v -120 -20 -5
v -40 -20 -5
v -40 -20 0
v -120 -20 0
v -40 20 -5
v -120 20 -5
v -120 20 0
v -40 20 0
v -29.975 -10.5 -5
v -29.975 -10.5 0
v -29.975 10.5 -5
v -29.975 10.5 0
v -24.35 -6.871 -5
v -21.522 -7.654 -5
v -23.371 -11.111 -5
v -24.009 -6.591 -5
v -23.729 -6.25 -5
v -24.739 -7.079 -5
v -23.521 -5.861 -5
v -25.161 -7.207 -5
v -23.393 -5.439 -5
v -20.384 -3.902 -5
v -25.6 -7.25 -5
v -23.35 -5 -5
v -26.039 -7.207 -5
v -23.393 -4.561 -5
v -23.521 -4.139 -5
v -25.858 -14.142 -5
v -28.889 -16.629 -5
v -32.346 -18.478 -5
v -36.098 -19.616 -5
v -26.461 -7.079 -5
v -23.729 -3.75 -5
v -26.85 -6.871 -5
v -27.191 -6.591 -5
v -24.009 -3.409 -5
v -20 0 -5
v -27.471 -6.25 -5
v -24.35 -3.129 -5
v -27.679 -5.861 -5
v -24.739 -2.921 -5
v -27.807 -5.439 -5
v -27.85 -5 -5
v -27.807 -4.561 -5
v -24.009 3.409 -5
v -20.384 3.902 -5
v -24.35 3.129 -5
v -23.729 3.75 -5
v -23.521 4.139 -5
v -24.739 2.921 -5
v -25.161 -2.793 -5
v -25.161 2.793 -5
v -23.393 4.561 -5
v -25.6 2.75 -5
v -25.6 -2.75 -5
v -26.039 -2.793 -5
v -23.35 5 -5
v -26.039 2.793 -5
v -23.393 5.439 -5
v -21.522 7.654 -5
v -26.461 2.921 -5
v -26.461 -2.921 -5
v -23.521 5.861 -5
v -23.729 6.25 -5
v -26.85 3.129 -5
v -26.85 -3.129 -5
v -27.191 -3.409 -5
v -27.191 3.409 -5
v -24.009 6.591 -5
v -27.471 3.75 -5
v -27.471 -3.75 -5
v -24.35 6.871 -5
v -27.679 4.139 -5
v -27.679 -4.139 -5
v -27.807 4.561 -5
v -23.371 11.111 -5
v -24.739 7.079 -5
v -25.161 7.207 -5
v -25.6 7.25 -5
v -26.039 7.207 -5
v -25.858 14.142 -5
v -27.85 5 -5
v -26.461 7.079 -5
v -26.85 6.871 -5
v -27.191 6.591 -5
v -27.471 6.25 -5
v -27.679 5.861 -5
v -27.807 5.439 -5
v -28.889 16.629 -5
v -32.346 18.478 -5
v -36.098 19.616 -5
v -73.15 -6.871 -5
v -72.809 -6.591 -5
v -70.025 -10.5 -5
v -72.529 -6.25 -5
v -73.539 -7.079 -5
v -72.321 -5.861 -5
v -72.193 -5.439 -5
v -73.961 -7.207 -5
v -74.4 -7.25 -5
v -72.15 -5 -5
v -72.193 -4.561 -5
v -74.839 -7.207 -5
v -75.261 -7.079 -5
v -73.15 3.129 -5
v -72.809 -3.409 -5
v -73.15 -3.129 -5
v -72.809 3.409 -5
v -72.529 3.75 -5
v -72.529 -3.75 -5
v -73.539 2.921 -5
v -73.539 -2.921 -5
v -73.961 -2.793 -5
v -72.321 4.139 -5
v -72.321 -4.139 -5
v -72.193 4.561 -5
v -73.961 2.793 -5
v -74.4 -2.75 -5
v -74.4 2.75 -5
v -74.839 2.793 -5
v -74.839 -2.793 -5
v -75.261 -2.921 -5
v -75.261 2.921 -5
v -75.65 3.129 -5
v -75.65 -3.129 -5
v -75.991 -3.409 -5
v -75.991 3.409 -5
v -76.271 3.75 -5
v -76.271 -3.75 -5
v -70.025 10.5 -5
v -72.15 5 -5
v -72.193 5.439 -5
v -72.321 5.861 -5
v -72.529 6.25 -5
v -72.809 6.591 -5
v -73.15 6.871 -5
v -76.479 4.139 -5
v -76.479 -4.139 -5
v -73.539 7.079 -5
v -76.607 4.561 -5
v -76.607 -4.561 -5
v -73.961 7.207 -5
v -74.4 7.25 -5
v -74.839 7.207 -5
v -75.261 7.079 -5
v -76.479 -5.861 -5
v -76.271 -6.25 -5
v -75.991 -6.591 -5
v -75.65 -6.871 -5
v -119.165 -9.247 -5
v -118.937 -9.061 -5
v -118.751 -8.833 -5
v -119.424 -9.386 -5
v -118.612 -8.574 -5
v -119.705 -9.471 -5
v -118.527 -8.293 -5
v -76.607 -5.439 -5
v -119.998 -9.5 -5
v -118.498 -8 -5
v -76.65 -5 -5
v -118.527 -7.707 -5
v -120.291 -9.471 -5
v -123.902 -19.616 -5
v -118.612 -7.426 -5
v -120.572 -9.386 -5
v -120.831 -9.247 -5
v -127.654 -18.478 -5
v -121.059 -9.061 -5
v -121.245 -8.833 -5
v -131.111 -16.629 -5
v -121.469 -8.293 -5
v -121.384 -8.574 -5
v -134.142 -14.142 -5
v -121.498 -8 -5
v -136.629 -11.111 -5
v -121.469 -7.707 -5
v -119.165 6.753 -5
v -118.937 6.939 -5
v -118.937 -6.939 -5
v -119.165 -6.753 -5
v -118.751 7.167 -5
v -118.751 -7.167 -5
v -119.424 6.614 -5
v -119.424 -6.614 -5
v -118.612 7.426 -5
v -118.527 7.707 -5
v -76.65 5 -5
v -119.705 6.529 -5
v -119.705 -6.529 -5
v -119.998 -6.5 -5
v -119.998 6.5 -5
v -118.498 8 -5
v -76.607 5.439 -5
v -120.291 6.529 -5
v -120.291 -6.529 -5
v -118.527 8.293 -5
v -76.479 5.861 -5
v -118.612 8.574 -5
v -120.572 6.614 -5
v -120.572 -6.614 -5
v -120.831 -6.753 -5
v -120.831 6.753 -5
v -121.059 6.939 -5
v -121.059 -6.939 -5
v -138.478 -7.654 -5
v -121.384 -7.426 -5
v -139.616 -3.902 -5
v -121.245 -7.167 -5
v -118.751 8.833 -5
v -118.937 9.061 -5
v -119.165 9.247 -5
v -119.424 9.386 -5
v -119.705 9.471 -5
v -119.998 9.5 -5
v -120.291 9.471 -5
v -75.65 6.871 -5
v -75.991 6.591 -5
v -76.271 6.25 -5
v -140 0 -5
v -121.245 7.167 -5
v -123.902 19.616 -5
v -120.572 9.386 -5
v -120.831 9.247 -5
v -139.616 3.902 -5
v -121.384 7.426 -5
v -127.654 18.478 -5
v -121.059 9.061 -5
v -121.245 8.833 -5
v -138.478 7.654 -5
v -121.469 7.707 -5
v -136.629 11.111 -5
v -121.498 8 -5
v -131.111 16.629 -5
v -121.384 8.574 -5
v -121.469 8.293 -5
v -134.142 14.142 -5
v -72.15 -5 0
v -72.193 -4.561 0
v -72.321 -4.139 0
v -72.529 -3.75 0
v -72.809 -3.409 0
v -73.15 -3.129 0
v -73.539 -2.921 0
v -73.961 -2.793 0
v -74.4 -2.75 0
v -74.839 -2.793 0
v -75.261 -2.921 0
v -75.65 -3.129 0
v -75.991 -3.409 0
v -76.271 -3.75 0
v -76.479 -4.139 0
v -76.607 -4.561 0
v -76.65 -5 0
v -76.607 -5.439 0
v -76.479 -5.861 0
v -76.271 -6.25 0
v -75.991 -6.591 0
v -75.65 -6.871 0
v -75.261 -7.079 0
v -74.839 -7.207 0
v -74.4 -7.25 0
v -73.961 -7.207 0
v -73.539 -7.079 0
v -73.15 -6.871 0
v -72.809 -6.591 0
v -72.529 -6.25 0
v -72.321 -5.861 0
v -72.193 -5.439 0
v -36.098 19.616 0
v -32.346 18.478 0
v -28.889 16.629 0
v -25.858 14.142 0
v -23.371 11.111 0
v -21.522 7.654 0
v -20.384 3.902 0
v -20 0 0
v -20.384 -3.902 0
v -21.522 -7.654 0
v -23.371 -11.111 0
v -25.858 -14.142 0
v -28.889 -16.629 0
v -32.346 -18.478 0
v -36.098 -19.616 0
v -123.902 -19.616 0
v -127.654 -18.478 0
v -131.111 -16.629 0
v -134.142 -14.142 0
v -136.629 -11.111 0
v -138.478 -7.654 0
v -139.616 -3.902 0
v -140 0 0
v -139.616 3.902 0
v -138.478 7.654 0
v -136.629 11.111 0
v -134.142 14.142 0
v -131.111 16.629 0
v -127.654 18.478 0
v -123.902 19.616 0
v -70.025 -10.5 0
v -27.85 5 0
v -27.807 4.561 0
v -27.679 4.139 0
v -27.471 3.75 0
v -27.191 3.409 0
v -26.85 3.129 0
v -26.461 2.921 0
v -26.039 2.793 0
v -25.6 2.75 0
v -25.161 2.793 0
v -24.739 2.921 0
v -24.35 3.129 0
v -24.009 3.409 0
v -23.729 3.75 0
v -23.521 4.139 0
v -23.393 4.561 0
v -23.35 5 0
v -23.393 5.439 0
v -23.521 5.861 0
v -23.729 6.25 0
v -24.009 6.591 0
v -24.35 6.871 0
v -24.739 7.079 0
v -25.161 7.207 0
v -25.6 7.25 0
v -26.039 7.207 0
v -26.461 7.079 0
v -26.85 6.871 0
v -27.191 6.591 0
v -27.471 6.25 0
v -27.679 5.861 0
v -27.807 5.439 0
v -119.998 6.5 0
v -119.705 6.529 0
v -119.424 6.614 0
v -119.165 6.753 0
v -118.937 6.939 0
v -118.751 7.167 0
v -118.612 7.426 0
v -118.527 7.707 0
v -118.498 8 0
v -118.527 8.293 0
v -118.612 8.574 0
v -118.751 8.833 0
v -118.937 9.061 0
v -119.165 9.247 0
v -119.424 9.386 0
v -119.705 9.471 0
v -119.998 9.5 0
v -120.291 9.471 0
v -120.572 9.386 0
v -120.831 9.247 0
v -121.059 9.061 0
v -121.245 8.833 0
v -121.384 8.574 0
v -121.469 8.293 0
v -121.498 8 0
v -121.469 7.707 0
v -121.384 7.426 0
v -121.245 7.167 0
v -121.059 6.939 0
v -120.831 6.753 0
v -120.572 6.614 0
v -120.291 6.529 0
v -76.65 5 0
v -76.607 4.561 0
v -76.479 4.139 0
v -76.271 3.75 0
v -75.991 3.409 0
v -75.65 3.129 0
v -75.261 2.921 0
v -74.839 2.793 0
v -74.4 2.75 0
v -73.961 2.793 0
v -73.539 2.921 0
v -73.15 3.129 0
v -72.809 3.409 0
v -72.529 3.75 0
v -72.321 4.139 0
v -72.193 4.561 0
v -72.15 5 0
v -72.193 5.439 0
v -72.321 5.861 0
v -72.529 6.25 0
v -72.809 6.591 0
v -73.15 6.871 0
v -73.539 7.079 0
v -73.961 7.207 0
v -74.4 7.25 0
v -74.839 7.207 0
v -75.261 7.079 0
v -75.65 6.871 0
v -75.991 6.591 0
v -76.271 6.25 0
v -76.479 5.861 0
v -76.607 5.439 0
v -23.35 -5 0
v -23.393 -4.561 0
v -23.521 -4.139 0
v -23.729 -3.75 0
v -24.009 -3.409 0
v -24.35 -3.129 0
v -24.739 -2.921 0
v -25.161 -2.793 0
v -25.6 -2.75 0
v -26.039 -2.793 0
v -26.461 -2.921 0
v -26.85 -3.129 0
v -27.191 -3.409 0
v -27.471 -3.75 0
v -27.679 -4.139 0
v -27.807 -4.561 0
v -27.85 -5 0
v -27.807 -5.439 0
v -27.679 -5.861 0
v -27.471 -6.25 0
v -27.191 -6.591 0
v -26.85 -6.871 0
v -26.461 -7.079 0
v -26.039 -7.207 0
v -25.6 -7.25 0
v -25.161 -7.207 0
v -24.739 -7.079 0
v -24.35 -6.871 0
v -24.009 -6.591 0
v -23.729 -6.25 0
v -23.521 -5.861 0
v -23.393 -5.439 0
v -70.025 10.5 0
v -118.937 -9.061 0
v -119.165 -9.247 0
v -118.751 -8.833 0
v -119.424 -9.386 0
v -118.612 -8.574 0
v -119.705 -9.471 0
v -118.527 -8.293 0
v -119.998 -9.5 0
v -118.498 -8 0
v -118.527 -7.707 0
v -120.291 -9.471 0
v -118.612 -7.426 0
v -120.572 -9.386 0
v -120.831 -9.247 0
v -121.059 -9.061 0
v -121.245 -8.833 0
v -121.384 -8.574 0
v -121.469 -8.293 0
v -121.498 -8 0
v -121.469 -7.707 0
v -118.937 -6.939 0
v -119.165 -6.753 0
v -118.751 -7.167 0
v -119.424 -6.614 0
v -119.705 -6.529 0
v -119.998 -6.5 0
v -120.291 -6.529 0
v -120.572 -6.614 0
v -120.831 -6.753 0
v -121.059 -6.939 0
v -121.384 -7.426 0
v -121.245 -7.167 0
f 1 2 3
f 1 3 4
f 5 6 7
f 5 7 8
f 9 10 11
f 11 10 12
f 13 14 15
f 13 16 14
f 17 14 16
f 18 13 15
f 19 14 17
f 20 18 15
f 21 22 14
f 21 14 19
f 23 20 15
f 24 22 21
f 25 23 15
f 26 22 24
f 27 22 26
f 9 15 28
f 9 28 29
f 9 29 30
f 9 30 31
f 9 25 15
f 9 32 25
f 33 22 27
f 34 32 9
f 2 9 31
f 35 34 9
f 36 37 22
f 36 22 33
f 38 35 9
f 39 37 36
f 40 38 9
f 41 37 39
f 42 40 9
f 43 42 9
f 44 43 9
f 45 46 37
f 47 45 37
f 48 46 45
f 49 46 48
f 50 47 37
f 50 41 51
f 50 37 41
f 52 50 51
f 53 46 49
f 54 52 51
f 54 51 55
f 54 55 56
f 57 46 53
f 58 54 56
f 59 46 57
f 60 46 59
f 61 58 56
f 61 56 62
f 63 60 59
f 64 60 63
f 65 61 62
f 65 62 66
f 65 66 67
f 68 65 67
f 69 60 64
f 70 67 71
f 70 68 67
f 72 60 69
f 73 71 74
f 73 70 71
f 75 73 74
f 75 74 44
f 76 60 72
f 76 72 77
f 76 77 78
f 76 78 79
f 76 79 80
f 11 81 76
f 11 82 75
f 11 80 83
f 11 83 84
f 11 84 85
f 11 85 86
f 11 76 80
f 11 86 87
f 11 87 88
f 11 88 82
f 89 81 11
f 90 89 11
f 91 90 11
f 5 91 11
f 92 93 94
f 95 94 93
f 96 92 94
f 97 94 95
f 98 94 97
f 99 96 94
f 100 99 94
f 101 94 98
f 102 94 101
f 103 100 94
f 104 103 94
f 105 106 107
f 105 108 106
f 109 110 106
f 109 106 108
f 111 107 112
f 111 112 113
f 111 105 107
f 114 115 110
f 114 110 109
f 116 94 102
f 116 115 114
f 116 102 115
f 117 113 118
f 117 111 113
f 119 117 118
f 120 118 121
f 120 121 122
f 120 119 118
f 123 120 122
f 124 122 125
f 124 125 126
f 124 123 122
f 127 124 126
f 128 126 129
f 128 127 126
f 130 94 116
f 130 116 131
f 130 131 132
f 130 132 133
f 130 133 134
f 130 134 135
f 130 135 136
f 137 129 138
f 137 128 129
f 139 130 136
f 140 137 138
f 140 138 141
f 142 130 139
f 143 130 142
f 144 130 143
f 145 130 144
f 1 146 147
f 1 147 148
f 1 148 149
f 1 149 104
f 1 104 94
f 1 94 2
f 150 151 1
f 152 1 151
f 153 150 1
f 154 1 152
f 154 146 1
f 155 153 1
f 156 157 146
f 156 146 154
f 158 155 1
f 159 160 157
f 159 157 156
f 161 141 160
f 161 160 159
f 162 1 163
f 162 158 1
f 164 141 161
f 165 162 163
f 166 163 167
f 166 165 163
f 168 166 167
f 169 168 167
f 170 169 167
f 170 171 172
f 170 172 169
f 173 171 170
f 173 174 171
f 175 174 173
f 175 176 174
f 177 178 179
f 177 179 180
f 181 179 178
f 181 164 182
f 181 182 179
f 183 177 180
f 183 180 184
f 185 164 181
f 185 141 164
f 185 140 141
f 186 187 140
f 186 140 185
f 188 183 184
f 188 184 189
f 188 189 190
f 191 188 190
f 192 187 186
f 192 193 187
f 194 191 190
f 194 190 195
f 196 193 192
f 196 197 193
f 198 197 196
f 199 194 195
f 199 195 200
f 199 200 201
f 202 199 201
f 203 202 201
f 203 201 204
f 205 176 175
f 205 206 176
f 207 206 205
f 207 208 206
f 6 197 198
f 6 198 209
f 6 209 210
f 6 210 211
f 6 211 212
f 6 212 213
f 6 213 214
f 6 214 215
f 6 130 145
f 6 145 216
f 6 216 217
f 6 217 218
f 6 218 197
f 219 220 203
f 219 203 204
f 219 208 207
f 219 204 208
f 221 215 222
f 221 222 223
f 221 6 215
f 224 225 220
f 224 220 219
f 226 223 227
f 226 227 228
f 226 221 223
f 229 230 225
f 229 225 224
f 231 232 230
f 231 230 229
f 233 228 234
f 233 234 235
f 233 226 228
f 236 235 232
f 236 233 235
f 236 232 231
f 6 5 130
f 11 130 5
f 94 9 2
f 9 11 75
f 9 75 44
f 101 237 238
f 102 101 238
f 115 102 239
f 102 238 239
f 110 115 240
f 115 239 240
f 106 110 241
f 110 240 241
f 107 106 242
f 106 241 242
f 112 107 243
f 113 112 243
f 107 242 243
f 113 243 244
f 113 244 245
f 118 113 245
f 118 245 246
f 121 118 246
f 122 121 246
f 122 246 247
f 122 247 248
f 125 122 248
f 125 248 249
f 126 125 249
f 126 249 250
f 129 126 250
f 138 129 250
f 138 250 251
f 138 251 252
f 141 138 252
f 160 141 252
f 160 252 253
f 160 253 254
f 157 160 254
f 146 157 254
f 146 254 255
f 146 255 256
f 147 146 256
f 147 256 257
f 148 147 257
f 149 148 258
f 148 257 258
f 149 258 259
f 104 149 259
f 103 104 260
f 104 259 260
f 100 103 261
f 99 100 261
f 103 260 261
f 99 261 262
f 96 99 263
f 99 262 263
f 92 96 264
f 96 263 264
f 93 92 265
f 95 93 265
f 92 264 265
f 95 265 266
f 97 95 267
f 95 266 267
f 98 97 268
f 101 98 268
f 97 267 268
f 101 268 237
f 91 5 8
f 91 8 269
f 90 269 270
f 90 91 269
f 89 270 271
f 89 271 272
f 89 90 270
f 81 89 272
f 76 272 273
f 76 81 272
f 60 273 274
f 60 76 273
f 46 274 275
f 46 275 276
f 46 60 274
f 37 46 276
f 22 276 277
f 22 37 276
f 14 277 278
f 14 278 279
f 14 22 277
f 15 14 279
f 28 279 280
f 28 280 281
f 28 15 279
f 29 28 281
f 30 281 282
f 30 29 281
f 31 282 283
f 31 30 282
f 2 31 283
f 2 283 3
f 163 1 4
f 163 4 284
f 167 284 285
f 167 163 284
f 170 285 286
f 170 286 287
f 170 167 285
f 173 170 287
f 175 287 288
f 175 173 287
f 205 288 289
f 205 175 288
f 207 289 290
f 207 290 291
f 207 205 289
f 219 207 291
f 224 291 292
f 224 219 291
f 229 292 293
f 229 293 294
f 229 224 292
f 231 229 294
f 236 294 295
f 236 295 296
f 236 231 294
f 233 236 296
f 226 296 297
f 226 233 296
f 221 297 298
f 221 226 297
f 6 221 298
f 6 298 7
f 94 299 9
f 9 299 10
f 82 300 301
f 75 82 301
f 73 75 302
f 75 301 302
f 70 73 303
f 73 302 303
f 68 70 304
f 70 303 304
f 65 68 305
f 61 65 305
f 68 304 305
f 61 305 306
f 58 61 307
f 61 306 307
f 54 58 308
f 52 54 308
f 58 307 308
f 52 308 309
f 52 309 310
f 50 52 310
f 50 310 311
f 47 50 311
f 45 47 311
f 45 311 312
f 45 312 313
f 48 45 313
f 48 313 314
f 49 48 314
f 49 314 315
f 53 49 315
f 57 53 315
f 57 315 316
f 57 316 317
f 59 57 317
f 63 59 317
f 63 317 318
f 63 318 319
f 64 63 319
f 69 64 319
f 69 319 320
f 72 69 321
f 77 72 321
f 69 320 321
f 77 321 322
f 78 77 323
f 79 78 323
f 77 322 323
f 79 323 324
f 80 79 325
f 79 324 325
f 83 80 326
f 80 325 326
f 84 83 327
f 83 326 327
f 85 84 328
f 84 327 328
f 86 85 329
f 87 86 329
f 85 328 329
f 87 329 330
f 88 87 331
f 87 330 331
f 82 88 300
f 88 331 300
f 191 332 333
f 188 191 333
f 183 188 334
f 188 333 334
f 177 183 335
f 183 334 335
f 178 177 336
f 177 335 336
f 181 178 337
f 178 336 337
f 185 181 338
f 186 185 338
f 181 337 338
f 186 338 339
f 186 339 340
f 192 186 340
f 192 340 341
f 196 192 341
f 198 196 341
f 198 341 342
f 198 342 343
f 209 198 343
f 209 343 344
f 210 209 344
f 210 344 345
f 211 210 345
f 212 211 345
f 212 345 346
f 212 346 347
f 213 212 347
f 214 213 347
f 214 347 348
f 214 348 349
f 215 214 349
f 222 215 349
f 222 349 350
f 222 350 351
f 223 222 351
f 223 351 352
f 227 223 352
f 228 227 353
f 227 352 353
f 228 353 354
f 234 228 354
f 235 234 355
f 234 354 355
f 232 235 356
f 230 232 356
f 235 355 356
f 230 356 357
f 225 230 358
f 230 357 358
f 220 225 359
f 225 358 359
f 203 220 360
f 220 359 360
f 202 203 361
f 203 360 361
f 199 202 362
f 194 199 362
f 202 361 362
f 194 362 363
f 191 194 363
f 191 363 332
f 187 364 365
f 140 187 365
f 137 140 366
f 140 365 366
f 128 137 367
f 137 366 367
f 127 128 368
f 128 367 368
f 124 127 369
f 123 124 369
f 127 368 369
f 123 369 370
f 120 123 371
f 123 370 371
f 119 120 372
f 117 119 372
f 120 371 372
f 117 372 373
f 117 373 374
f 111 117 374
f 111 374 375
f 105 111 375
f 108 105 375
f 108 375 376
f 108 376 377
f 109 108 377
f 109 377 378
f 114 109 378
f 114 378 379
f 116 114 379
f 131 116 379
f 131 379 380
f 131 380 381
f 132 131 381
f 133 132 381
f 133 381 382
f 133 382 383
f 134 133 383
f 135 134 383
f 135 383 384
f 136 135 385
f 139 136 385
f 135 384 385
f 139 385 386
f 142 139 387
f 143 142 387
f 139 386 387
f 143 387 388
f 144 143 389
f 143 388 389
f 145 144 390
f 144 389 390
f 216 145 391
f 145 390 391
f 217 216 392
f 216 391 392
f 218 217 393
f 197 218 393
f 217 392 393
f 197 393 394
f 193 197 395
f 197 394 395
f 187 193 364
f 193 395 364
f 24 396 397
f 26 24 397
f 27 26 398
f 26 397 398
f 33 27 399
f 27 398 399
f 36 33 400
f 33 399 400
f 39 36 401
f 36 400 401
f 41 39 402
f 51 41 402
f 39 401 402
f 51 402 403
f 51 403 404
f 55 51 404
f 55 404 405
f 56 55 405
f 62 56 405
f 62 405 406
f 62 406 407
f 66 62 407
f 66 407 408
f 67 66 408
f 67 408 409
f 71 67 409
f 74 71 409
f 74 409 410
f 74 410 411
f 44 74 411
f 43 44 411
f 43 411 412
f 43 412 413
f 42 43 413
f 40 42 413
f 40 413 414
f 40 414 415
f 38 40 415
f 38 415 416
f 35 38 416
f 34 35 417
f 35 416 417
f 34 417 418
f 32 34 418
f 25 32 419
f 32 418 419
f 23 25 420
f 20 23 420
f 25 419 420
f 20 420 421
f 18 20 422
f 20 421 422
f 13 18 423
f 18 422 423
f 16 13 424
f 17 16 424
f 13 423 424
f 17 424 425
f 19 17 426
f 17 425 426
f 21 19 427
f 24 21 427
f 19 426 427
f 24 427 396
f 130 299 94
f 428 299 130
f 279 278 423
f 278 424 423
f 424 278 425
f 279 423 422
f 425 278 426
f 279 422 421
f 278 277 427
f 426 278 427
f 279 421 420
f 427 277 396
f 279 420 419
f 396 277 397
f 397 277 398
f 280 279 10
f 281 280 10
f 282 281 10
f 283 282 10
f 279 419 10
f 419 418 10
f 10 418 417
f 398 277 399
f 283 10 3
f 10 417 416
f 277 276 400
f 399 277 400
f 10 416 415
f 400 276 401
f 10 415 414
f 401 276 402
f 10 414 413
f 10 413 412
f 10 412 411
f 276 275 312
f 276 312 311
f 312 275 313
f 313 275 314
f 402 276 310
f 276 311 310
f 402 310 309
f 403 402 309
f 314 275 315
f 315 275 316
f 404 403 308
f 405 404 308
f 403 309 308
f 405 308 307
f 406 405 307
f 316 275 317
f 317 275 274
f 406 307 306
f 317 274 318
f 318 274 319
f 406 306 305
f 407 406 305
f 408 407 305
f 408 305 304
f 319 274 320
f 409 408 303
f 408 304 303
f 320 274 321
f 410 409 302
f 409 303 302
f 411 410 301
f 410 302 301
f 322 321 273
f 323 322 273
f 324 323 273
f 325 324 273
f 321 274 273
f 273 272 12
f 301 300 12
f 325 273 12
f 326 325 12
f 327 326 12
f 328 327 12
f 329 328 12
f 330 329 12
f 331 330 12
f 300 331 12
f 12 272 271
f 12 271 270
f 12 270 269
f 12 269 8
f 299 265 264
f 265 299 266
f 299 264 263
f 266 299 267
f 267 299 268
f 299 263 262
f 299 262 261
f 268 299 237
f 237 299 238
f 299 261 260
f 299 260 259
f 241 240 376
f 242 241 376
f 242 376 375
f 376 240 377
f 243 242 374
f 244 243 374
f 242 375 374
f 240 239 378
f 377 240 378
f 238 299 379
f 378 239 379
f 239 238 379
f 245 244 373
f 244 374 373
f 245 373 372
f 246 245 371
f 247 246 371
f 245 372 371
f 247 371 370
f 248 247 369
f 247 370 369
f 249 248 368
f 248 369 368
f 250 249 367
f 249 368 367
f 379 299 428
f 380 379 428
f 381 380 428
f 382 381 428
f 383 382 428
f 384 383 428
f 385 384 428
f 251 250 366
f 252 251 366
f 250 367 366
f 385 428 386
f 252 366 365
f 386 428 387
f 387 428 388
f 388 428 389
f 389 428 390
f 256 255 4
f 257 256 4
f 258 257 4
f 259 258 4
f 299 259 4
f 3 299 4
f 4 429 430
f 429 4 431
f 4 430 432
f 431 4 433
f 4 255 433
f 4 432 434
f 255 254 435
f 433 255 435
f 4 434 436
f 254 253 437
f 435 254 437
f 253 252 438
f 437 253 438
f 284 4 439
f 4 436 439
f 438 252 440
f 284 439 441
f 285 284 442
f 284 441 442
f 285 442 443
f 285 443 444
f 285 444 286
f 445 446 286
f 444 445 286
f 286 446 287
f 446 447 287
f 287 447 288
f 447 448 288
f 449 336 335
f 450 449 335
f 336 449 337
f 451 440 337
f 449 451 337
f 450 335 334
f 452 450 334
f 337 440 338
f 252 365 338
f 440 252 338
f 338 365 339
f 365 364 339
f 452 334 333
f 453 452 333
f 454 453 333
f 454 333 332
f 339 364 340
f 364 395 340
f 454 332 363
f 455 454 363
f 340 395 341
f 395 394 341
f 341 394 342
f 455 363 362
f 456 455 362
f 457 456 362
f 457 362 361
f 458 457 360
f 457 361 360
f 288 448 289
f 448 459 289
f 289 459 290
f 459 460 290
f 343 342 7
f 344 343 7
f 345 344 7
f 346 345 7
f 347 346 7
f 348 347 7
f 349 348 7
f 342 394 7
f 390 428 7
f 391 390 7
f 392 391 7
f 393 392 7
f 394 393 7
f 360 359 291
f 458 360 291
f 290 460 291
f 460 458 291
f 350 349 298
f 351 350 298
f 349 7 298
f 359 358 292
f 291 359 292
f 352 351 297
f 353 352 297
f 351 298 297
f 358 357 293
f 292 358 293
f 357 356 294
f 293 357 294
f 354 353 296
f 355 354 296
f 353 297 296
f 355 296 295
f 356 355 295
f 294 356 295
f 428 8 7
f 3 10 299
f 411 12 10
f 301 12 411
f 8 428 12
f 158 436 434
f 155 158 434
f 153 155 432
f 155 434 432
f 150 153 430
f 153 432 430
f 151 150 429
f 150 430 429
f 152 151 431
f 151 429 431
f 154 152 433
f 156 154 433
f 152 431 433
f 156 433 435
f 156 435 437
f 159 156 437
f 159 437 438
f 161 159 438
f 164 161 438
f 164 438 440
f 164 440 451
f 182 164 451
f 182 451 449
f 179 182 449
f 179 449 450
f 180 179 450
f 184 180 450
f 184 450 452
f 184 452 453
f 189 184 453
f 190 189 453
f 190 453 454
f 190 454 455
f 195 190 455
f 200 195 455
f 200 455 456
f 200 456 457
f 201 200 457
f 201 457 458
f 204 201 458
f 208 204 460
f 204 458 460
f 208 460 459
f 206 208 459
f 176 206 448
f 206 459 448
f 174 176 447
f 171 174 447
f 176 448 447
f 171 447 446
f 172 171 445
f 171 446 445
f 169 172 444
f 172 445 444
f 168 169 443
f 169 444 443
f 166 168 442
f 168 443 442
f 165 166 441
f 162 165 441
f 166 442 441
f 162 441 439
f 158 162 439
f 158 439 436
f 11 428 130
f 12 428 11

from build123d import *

# Parameters (mm, degrees)
BOSS_EXTRUDE1_DEPTH   = 5
CUT_EXTRUDE1_REACH    = 104.103
SKETCH2_R             = 1.5
BODY_MOVE_COPY1_ANGLE = 90
SKETCH19_R            = 2.25
SKETCH19_W            = 40.05
SKETCH19_H            = 21
CUT_EXTRUDE9_DEPTH    = 103.102889283


with BuildPart() as part:
    # Sketch1 → Boss-Extrude1 (new body)
    with BuildSketch(Plane(origin=(0, 0, 0), x_dir=(1, 0, 0), z_dir=(0, 1, 0))):
        with BuildLine():
            Line((80, -20), (0, -20))
            ThreePointArc((0, -20), (-20, 0), (0, 20))
            Line((0, 20), (80, 20))
            ThreePointArc((80, 20), (100, 0), (80, -20))
        make_face()
    extrude(amount=BOSS_EXTRUDE1_DEPTH)

    # Sketch2 → Cut-Extrude1 (cut, up to next)
    with BuildSketch(Plane(origin=(0, 5, 0), x_dir=(1, 0, 0), z_dir=(0, 1, 0)), mode=Mode.PRIVATE) as cut_extrude1_sk1:
        with Locations(Location((0.002, 7.999999875, 0), (0, 0, 270))):
            Circle(SKETCH2_R)
    cut_extrude1_tool1 = extrude(cut_extrude1_sk1.sketch, amount=-CUT_EXTRUDE1_REACH, mode=Mode.PRIVATE) & part.part
    # Sketch2 → Cut-Extrude1 (cut, up to next)
    with BuildSketch(Plane(origin=(0, 5, 0), x_dir=(1, 0, 0), z_dir=(0, 1, 0)), mode=Mode.PRIVATE) as cut_extrude1_sk2:
        with Locations(Location((0.002, -8.00000025, 0), (0, 0, 270))):
            Circle(SKETCH2_R)
    cut_extrude1_tool2 = extrude(cut_extrude1_sk2.sketch, amount=-CUT_EXTRUDE1_REACH, mode=Mode.PRIVATE) & part.part
    add(cut_extrude1_tool1.solids().sort_by_distance((0.002, 5, -8))[0], mode=Mode.SUBTRACT)
    add(cut_extrude1_tool2.solids().sort_by_distance((0.002, 5, 8))[0], mode=Mode.SUBTRACT)


with BuildPart() as part_1:
    # Body-Move/Copy1: moved
    add(part.part.rotate(Axis((0, 0, 0), (1, 0, 0)), BODY_MOVE_COPY1_ANGLE))

    # Sketch19 → Cut-Extrude9 (cut, through all)
    with BuildSketch(Plane.XY.offset(5)):
        with Locations((94.4, -5)):
            Circle(SKETCH19_R)
        with Locations(Location((94.4, 5, 0), (0, 0, 180))):
            Circle(SKETCH19_R)
        with Locations(Location((45.6, 5, 0), (0, 0, 180))):
            Circle(SKETCH19_R)
        with Locations((45.6, -5)):
            Circle(SKETCH19_R)
        with Locations((70, 0)):
            Rectangle(SKETCH19_W, SKETCH19_H)
    extrude(amount=-CUT_EXTRUDE9_DEPTH, mode=Mode.SUBTRACT)


with BuildPart() as part_2:
    # Body-Move/Copy5: moved
    add(part_1.part.moved(Location((-120, 0, 0))))


with BuildPart() as part_3:
    # Body-Move/Copy6: moved
    add(part_2.part.moved(Location((0, 0, -5))))


solid = part_3.part
